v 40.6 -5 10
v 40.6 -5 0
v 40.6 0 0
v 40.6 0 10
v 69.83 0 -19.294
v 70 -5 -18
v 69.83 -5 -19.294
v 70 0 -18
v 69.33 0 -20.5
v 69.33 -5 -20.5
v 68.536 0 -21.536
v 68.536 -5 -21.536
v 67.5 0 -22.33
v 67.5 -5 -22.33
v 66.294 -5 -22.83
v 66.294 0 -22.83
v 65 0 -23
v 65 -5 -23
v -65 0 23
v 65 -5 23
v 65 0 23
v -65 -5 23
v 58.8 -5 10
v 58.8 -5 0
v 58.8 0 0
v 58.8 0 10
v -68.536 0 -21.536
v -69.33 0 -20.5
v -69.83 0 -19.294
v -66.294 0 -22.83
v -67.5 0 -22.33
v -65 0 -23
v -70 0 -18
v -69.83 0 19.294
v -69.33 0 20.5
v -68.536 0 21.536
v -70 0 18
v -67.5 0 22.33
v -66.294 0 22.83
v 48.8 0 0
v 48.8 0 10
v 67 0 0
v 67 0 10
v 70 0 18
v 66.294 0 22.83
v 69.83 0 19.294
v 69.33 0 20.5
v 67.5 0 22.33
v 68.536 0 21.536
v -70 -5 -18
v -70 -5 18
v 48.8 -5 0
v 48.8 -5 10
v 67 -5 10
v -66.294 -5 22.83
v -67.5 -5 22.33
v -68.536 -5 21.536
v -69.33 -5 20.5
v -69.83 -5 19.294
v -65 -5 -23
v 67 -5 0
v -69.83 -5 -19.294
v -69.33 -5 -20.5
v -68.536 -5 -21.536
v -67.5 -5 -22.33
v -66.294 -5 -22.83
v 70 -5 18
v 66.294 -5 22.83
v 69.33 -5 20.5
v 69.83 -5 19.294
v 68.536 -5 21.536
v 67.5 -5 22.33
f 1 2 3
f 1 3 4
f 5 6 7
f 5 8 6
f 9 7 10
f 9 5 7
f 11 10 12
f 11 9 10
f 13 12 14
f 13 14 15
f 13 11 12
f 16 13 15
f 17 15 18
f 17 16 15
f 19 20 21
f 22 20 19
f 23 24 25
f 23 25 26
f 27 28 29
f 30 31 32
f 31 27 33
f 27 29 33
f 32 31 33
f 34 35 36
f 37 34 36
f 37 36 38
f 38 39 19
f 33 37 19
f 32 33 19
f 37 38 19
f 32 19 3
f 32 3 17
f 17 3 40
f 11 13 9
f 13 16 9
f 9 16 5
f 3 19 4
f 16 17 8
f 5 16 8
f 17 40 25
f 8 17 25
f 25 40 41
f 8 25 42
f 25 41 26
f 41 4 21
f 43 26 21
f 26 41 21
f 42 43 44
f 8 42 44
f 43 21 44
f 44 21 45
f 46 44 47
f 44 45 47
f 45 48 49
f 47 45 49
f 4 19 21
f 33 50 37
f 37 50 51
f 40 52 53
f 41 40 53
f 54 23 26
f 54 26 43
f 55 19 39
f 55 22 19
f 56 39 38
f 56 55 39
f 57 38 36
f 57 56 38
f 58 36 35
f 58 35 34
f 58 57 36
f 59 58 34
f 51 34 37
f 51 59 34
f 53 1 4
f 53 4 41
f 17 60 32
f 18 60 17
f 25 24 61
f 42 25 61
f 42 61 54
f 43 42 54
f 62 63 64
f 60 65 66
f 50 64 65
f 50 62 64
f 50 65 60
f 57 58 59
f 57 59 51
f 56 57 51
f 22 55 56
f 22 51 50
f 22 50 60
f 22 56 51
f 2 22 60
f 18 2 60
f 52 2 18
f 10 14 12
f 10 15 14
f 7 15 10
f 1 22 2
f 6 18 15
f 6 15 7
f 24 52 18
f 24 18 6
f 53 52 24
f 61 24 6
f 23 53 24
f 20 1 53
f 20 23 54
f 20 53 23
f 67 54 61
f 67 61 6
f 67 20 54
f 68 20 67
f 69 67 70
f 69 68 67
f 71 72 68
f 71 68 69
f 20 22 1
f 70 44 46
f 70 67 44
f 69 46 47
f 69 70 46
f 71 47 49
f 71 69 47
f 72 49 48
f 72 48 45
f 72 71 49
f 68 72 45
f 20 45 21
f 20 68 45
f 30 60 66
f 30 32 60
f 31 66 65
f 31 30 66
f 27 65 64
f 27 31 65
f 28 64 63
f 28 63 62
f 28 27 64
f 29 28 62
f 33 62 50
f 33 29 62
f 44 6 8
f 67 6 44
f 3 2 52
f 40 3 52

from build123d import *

# Parameters (mm, degrees)
F0_W     = 45
F0_H     = 46
F0_W_2   = 8.2
F0_H_2   = 10
F0_W_3   = 95
F1_DEPTH = 5
F2_DEPTH = 25
F3_R     = 5


with BuildPart() as f1:
    # F0 (on Front) → F1 (new body, symmetric)
    with BuildSketch(Plane.XZ):
        with Locations((47.5, 0)):
            Rectangle(F0_W, F0_H)
        with Locations((44.7, 5)):
            Rectangle(F0_W_2, F0_H_2, mode=Mode.SUBTRACT)
        with Locations((62.9, 5)):
            Rectangle(F0_W_2, F0_H_2, mode=Mode.SUBTRACT)
        with Locations((-22.5, 0)):
            Rectangle(F0_W_3, F0_H)
    extrude(amount=F1_DEPTH, both=True)

    # F0 (on Front) → F2 (cut)
    with BuildSketch(Plane.XZ):
        with Locations((47.5, 0)):
            Rectangle(F0_W, F0_H)
        with Locations((44.7, 5)):
            Rectangle(F0_W_2, F0_H_2, mode=Mode.SUBTRACT)
        with Locations((62.9, 5)):
            Rectangle(F0_W_2, F0_H_2, mode=Mode.SUBTRACT)
        with Locations((-22.5, 0)):
            Rectangle(F0_W_3, F0_H)
    extrude(amount=-F2_DEPTH, mode=Mode.SUBTRACT)

    # F3
    f3_edges = [f1.edges().sort_by_distance(p)[0] for p in [
        (-70, -2.5, 23),
        (-70, -2.5, -23),
        (70, -2.5, 23),
        (70, -2.5, -23),
    ]]
    fillet(f3_edges, radius=F3_R)


solid = f1.part
